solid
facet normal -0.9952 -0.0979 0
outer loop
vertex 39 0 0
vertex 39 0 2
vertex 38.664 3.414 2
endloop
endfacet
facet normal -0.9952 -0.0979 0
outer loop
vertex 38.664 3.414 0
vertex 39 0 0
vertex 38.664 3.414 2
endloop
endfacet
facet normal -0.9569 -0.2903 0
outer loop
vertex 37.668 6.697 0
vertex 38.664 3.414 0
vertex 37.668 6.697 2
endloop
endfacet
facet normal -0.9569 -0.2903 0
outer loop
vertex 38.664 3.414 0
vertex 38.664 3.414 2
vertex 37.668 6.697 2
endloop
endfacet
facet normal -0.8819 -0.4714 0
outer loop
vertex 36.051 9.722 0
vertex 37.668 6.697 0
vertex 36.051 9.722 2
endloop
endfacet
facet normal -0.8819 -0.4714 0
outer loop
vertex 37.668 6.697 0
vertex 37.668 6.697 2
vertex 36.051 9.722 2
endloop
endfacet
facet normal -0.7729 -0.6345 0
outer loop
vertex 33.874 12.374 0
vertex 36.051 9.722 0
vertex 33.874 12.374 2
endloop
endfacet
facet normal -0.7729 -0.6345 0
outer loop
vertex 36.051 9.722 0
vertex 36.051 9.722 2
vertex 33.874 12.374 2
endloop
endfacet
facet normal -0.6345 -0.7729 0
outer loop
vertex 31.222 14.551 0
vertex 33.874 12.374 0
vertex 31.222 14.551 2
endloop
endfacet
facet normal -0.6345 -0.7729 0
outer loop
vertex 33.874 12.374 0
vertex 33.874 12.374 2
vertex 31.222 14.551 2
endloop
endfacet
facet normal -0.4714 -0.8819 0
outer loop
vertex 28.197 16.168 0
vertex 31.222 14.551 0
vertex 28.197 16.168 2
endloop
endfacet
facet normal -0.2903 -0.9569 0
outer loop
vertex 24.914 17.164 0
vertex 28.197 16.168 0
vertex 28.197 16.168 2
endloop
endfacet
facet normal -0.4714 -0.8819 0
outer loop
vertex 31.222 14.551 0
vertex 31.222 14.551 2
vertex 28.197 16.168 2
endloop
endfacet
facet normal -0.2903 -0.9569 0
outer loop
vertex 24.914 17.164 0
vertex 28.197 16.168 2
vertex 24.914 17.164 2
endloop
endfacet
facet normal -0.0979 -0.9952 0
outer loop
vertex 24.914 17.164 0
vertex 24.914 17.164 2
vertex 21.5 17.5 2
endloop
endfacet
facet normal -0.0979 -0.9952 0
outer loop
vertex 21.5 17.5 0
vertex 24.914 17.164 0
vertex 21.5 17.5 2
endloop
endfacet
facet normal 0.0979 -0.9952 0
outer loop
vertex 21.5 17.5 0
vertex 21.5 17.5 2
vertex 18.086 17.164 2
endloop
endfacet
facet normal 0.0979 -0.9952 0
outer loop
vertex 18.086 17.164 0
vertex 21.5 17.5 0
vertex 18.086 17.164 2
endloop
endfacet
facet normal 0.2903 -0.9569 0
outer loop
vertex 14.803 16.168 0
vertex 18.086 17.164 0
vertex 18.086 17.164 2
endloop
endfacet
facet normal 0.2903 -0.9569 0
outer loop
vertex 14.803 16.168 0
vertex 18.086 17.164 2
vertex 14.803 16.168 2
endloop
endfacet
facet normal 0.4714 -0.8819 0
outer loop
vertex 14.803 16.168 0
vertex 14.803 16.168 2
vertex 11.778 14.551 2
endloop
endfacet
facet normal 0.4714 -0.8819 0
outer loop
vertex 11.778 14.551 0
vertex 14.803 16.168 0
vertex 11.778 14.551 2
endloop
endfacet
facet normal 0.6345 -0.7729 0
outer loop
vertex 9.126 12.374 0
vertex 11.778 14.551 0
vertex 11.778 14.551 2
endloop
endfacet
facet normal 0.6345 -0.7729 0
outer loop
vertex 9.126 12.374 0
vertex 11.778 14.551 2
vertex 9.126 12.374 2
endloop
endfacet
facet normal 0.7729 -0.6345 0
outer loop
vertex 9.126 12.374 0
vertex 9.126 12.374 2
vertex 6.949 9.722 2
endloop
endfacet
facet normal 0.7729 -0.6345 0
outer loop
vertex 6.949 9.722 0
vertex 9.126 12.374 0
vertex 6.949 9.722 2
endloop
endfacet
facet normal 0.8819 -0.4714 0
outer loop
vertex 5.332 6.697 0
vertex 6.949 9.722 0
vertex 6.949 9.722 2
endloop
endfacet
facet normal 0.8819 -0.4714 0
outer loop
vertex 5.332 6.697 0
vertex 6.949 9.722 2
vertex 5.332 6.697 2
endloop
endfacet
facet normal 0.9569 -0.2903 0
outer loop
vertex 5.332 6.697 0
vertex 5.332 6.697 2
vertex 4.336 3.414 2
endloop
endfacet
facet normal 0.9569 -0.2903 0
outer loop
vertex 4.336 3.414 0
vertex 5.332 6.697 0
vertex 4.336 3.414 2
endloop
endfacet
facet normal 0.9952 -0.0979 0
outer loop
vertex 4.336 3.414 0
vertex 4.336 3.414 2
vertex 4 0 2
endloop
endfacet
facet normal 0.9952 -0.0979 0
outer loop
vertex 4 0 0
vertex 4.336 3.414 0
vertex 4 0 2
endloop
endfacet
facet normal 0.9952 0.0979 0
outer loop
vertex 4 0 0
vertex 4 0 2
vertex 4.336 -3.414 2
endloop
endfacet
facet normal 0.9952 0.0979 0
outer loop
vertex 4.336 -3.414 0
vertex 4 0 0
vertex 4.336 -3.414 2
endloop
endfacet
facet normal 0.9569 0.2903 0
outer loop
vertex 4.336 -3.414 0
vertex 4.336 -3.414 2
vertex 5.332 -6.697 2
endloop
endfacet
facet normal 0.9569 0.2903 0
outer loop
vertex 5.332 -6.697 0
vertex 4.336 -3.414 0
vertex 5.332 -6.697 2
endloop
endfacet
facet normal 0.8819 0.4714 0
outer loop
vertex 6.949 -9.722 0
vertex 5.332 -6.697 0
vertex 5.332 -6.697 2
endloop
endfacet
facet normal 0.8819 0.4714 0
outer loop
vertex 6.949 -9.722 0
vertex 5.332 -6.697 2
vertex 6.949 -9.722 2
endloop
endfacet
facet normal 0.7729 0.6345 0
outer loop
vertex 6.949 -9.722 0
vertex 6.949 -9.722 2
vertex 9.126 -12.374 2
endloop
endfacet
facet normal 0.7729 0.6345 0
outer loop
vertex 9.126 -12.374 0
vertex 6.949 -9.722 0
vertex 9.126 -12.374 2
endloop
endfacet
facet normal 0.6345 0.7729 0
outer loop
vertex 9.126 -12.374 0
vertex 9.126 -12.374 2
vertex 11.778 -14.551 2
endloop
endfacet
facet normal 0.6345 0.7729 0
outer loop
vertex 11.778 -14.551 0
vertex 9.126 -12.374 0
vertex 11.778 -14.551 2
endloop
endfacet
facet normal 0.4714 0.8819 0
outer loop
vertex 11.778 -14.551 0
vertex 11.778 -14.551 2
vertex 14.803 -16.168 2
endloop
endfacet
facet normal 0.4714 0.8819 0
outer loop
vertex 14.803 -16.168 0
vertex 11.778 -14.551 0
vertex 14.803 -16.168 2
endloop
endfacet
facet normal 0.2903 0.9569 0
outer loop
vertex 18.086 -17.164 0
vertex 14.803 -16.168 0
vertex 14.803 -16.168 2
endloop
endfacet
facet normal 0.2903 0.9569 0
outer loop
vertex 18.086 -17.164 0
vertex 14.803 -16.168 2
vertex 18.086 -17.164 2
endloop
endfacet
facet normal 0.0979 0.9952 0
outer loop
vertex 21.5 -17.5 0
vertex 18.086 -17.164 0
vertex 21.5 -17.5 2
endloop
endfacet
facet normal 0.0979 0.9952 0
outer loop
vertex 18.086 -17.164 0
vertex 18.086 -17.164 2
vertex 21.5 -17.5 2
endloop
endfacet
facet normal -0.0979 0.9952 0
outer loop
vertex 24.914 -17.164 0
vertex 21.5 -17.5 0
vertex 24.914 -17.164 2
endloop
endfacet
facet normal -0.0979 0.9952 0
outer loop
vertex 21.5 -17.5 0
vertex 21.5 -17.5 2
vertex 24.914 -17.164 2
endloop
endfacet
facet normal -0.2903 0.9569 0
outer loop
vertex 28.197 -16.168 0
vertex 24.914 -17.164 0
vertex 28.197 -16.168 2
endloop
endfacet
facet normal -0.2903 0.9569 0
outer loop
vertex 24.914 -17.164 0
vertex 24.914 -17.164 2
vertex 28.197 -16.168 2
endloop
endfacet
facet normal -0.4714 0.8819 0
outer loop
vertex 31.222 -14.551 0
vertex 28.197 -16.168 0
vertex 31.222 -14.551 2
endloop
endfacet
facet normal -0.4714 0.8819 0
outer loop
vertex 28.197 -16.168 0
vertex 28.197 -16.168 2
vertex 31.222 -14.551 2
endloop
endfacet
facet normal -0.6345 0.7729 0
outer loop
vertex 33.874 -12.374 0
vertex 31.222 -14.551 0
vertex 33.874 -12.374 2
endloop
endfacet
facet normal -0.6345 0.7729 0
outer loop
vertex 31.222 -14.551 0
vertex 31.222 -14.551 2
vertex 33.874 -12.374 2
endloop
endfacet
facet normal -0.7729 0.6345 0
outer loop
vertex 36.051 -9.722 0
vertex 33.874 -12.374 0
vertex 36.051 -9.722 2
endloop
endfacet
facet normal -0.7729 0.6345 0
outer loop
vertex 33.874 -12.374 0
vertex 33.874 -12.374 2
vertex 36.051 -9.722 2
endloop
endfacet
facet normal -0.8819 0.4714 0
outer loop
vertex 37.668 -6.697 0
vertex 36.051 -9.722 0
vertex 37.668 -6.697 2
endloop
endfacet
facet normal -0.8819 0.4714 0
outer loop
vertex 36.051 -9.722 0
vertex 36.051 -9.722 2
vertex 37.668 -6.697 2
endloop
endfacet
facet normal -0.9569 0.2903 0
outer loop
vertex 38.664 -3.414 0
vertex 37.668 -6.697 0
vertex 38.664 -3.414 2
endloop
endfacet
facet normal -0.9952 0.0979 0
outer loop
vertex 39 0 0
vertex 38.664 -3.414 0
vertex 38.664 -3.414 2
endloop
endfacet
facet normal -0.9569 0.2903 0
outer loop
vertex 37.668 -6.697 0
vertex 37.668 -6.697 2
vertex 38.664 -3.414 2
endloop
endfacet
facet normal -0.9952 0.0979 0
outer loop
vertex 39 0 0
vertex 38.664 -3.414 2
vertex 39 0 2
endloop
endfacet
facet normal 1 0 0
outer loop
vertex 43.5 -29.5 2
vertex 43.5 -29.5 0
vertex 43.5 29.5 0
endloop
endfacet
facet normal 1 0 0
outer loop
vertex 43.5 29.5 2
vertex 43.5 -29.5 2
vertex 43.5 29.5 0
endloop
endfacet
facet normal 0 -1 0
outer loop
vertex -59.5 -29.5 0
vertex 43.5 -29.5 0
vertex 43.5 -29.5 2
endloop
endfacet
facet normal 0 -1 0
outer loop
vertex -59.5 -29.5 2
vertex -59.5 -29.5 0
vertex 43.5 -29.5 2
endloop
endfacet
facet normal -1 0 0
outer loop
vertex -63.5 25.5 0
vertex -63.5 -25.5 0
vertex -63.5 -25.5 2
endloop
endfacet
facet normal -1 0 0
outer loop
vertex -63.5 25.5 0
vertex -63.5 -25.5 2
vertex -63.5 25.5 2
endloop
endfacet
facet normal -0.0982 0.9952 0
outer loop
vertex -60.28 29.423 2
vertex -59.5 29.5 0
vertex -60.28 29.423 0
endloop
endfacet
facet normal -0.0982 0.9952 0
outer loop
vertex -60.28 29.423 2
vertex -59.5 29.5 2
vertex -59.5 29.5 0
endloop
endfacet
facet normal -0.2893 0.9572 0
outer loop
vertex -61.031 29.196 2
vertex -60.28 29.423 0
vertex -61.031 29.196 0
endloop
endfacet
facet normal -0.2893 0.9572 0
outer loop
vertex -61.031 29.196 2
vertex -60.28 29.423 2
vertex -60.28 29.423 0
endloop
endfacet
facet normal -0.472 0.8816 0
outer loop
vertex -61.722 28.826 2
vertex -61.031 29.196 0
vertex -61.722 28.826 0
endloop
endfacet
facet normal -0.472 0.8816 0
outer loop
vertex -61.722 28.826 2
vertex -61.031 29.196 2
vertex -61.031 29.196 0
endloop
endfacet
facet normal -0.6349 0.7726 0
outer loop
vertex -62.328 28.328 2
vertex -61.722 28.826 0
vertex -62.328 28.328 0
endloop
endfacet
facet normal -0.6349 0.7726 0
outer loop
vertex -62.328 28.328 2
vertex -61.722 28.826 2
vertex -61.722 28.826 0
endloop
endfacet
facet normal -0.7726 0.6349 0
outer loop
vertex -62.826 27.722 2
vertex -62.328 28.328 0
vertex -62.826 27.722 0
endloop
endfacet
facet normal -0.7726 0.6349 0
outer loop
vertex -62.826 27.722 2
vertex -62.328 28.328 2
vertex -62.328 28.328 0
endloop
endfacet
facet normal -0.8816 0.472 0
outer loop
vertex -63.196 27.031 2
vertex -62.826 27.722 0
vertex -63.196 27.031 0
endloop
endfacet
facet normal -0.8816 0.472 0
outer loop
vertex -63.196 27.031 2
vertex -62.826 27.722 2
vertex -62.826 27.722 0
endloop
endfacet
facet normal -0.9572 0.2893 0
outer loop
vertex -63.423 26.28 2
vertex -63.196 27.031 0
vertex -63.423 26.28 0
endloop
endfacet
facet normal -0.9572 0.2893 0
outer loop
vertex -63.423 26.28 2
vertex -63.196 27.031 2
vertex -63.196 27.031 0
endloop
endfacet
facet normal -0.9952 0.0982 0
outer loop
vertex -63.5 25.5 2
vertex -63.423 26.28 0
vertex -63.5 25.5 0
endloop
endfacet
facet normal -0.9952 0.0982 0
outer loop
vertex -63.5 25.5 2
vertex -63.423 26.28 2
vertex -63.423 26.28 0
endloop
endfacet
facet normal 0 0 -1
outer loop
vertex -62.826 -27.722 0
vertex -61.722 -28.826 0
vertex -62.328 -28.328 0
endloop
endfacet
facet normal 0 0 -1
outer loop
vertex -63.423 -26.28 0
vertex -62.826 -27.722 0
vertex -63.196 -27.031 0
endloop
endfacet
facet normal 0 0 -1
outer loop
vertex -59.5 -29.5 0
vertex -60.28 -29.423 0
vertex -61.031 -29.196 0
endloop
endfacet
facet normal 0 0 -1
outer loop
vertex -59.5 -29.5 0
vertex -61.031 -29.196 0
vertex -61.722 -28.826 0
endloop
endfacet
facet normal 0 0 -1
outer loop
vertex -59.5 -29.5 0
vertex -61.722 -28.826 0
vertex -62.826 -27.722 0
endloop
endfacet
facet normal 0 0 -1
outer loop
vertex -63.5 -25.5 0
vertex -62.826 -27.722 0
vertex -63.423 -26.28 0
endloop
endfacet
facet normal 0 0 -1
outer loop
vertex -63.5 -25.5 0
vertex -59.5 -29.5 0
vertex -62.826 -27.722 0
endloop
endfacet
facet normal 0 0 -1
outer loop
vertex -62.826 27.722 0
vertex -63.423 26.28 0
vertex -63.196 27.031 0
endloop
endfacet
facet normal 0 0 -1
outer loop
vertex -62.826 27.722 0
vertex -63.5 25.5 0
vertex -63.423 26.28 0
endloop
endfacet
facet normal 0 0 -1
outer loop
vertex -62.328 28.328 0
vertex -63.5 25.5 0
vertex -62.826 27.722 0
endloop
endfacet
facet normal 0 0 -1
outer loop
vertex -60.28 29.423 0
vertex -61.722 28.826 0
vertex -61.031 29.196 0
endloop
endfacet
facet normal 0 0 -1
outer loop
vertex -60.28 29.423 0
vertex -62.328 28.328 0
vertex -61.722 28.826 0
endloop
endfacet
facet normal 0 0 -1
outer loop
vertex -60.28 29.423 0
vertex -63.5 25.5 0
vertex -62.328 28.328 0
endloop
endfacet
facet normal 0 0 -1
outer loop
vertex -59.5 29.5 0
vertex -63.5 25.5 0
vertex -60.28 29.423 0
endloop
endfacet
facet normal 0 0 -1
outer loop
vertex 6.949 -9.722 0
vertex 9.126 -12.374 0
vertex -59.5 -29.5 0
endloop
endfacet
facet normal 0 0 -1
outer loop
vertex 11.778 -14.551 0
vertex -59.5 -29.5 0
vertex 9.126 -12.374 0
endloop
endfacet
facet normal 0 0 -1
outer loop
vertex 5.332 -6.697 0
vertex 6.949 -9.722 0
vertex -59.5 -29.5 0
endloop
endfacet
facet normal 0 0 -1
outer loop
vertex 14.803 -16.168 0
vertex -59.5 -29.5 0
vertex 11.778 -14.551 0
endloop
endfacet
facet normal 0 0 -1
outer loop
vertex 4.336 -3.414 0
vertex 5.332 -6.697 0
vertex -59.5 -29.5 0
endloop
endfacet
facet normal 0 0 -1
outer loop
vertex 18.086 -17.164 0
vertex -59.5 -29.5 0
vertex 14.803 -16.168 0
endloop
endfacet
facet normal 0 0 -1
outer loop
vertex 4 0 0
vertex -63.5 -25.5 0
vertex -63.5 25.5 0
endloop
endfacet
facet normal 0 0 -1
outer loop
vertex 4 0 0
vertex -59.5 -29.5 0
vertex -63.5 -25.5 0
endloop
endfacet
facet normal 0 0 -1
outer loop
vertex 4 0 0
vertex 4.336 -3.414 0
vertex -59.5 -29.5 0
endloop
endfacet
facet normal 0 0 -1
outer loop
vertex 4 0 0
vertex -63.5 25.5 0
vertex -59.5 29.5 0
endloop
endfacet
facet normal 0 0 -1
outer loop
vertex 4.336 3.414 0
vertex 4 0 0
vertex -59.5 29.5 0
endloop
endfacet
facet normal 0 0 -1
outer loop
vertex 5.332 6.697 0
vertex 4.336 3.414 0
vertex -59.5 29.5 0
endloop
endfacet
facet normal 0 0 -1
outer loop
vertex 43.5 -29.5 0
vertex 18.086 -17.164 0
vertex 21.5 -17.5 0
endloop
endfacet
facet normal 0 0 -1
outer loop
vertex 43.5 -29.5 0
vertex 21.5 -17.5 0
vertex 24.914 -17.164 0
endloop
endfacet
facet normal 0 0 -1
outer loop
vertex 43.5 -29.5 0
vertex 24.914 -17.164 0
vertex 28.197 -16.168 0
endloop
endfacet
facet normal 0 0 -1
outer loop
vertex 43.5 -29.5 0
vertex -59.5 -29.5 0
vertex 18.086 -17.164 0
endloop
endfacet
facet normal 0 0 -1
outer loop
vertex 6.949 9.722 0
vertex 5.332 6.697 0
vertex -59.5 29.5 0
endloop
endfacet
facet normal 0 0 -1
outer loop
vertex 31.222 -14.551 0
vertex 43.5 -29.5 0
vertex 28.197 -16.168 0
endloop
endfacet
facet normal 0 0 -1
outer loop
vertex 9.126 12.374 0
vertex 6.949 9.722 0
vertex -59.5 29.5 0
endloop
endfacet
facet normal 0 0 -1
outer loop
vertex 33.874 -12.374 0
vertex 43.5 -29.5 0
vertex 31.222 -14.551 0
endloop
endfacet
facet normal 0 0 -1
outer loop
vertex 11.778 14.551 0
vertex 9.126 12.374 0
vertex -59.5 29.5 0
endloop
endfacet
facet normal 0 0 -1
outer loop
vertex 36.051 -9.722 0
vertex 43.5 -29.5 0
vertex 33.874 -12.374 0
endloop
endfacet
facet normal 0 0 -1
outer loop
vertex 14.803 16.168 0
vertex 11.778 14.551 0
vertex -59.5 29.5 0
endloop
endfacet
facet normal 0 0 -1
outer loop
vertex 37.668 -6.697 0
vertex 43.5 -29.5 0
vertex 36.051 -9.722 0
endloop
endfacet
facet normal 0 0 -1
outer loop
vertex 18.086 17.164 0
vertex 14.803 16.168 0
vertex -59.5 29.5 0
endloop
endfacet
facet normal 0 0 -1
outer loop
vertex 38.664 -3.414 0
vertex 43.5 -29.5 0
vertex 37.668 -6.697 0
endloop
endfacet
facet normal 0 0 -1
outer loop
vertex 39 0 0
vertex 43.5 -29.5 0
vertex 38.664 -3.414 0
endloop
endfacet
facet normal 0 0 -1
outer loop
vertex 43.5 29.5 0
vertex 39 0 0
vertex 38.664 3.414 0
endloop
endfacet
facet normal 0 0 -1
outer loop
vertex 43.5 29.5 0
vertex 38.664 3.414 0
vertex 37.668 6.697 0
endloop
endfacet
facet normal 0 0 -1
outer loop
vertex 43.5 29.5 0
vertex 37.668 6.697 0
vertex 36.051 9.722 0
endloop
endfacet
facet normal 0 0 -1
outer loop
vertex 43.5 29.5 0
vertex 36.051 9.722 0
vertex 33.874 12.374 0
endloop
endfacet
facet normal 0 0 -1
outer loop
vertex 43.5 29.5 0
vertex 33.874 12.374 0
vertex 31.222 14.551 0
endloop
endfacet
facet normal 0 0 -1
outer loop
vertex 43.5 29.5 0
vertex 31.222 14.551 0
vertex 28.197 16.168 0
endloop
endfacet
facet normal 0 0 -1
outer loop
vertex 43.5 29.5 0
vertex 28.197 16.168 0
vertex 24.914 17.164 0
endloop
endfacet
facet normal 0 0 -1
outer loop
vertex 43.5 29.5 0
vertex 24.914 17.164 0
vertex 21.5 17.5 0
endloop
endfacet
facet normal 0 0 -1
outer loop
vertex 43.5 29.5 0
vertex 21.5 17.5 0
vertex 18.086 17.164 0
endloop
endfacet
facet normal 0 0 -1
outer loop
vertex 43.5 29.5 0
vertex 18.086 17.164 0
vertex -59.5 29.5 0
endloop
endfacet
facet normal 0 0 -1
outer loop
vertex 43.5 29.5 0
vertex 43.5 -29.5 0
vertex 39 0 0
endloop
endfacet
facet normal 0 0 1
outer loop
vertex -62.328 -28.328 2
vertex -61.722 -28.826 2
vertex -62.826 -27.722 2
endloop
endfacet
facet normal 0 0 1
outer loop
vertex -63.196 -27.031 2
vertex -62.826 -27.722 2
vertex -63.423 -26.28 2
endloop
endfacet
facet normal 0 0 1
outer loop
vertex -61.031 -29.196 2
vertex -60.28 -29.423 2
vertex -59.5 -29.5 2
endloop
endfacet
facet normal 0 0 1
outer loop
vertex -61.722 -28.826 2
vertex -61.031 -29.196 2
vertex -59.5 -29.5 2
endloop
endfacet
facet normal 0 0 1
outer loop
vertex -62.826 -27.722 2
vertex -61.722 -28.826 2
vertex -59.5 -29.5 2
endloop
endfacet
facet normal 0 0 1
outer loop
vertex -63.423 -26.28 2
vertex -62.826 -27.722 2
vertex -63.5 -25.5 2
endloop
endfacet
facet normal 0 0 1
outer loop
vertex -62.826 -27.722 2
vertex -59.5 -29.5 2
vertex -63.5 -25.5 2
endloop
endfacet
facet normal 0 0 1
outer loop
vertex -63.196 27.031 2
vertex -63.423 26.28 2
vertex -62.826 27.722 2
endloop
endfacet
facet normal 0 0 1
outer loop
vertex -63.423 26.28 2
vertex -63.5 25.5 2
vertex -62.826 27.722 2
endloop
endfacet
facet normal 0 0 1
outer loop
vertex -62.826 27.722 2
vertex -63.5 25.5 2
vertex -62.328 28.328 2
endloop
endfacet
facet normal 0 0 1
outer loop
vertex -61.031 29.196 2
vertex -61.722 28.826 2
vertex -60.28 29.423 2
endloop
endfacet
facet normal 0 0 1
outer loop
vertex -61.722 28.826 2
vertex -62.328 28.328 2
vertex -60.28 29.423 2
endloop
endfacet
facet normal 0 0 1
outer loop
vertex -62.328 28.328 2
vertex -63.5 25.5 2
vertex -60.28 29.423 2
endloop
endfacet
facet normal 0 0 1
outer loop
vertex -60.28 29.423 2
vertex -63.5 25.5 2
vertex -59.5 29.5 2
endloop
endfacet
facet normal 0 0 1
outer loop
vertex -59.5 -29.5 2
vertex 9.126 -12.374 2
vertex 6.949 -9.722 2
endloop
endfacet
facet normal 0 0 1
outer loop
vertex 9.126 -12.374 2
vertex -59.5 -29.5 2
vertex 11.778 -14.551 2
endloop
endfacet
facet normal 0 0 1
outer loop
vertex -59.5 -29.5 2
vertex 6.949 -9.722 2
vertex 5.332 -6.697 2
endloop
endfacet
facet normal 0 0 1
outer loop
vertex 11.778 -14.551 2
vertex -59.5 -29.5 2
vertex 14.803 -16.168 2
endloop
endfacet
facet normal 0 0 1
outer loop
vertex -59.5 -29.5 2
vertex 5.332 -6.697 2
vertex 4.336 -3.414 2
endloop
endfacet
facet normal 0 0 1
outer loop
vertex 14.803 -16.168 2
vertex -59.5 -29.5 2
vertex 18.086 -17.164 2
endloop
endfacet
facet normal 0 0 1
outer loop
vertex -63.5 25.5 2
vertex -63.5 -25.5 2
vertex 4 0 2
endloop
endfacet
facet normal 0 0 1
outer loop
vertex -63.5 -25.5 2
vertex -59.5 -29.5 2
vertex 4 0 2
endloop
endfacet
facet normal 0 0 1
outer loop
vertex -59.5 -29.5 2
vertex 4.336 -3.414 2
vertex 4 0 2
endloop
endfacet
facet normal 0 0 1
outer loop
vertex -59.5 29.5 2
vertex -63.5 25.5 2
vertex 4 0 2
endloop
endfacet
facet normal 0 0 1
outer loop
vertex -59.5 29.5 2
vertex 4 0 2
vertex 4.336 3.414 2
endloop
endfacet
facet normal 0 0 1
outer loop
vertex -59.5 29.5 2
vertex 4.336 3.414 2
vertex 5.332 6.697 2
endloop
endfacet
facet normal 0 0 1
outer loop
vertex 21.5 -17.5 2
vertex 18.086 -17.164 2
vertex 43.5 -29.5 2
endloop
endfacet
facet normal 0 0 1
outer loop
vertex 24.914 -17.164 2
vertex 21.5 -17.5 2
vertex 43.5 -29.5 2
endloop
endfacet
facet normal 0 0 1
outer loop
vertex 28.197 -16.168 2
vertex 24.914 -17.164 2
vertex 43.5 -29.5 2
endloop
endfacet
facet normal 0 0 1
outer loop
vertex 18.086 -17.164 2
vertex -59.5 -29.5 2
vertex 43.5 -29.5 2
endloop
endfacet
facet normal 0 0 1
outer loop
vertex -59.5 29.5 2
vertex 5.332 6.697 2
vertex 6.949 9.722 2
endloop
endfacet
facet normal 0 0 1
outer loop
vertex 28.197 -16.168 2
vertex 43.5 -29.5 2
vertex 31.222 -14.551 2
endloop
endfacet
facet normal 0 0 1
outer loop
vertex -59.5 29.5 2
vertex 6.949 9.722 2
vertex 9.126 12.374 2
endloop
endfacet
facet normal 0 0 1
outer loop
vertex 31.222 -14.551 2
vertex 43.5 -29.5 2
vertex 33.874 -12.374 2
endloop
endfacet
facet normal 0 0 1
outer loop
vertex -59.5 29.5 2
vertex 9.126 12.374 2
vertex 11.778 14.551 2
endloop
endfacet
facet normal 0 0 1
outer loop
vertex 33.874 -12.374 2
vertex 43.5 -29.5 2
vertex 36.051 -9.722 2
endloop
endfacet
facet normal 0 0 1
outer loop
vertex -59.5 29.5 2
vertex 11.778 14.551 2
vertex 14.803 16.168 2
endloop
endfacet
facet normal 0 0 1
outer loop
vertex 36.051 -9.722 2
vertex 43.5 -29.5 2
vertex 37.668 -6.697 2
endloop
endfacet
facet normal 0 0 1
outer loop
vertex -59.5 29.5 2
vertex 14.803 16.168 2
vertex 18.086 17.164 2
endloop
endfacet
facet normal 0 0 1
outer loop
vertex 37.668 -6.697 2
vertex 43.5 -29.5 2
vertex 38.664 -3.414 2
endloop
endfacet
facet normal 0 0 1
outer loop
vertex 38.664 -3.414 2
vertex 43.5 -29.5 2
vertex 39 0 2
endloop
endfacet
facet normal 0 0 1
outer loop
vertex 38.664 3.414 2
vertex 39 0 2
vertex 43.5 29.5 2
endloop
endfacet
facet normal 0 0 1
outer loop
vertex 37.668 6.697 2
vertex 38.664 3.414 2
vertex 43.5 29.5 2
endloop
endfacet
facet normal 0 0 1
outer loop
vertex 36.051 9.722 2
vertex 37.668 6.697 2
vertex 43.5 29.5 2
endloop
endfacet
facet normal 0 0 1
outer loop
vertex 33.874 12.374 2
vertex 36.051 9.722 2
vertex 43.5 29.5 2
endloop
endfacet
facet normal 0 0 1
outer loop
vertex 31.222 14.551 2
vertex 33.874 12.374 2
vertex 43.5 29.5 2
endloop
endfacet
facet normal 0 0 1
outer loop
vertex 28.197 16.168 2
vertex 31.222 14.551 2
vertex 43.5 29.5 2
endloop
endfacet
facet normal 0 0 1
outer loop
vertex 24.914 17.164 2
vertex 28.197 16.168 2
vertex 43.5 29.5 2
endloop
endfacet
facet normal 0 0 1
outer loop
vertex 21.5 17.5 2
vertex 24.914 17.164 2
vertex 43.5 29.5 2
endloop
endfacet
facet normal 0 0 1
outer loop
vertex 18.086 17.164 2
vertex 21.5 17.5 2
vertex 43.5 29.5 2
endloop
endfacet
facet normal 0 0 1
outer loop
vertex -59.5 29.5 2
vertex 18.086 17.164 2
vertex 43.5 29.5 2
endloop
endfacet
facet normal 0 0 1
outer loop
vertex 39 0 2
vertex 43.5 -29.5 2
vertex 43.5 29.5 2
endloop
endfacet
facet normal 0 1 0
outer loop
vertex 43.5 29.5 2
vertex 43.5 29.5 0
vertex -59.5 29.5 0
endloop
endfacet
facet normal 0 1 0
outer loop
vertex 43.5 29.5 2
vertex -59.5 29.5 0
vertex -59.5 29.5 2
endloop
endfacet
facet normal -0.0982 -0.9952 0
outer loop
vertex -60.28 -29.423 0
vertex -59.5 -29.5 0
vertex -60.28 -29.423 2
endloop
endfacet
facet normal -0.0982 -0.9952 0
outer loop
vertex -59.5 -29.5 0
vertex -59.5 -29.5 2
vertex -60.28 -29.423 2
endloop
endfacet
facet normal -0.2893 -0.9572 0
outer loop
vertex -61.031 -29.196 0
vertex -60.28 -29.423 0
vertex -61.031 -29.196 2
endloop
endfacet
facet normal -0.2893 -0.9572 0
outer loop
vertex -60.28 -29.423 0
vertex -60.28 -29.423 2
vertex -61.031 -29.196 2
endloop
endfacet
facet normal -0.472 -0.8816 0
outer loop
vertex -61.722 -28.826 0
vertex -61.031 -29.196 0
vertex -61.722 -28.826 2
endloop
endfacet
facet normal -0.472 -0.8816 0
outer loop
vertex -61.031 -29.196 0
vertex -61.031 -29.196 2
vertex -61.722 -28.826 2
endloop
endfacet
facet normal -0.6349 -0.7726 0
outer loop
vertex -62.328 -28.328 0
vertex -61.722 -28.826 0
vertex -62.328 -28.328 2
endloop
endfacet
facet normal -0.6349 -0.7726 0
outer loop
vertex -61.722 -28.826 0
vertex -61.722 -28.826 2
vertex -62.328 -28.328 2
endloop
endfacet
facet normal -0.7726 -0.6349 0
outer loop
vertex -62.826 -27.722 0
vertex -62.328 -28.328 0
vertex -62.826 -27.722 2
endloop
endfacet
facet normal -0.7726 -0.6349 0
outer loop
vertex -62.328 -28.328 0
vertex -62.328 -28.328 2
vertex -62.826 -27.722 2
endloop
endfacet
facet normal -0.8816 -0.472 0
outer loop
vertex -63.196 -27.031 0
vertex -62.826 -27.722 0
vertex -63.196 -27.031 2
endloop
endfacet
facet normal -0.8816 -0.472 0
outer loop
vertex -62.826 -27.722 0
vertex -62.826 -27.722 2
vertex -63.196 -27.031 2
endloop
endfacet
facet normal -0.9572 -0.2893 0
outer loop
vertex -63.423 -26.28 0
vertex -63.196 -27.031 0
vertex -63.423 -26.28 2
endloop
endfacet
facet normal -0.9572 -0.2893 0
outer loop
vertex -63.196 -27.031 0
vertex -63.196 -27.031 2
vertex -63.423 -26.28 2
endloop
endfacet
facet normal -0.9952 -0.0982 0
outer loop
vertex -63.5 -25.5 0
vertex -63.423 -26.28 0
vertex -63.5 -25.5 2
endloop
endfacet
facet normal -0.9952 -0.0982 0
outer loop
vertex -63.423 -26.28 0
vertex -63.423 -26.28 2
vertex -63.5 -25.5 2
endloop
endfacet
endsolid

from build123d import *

# Parameters (mm, degrees)
F0_W     = 87
F0_H     = 59
F1_DEPTH = 2
F2_R     = 17.5
F3_DEPTH = 25
F4_DEPTH = 20
F5_R     = 4


with BuildPart() as f1:
    # F0 (on Top) → F1 (new body)
    with BuildSketch(Plane.XY):
        Rectangle(F0_W, F0_H)
    extrude(amount=F1_DEPTH)

    # F2 (on face) → F3 (cut)
    with BuildSketch(Plane.XY.offset(2)):
        with Locations((21.5, 0)):
            Circle(F2_R)
    extrude(amount=-F3_DEPTH, mode=Mode.SUBTRACT)

    # F4 (add): a face of the model
    f4_faces = [f1.faces().sort_by_distance(p)[0] for p in [
        (-43.5, 0, 1),
    ]]
    extrude(f4_faces, amount=F4_DEPTH)

    # F5
    f5_edges = [f1.edges().sort_by_distance(p)[0] for p in [
        (-63.5, 29.5, 1),
        (-63.5, -29.5, 1),
    ]]
    fillet(f5_edges, radius=F5_R)


solid = f1.part
